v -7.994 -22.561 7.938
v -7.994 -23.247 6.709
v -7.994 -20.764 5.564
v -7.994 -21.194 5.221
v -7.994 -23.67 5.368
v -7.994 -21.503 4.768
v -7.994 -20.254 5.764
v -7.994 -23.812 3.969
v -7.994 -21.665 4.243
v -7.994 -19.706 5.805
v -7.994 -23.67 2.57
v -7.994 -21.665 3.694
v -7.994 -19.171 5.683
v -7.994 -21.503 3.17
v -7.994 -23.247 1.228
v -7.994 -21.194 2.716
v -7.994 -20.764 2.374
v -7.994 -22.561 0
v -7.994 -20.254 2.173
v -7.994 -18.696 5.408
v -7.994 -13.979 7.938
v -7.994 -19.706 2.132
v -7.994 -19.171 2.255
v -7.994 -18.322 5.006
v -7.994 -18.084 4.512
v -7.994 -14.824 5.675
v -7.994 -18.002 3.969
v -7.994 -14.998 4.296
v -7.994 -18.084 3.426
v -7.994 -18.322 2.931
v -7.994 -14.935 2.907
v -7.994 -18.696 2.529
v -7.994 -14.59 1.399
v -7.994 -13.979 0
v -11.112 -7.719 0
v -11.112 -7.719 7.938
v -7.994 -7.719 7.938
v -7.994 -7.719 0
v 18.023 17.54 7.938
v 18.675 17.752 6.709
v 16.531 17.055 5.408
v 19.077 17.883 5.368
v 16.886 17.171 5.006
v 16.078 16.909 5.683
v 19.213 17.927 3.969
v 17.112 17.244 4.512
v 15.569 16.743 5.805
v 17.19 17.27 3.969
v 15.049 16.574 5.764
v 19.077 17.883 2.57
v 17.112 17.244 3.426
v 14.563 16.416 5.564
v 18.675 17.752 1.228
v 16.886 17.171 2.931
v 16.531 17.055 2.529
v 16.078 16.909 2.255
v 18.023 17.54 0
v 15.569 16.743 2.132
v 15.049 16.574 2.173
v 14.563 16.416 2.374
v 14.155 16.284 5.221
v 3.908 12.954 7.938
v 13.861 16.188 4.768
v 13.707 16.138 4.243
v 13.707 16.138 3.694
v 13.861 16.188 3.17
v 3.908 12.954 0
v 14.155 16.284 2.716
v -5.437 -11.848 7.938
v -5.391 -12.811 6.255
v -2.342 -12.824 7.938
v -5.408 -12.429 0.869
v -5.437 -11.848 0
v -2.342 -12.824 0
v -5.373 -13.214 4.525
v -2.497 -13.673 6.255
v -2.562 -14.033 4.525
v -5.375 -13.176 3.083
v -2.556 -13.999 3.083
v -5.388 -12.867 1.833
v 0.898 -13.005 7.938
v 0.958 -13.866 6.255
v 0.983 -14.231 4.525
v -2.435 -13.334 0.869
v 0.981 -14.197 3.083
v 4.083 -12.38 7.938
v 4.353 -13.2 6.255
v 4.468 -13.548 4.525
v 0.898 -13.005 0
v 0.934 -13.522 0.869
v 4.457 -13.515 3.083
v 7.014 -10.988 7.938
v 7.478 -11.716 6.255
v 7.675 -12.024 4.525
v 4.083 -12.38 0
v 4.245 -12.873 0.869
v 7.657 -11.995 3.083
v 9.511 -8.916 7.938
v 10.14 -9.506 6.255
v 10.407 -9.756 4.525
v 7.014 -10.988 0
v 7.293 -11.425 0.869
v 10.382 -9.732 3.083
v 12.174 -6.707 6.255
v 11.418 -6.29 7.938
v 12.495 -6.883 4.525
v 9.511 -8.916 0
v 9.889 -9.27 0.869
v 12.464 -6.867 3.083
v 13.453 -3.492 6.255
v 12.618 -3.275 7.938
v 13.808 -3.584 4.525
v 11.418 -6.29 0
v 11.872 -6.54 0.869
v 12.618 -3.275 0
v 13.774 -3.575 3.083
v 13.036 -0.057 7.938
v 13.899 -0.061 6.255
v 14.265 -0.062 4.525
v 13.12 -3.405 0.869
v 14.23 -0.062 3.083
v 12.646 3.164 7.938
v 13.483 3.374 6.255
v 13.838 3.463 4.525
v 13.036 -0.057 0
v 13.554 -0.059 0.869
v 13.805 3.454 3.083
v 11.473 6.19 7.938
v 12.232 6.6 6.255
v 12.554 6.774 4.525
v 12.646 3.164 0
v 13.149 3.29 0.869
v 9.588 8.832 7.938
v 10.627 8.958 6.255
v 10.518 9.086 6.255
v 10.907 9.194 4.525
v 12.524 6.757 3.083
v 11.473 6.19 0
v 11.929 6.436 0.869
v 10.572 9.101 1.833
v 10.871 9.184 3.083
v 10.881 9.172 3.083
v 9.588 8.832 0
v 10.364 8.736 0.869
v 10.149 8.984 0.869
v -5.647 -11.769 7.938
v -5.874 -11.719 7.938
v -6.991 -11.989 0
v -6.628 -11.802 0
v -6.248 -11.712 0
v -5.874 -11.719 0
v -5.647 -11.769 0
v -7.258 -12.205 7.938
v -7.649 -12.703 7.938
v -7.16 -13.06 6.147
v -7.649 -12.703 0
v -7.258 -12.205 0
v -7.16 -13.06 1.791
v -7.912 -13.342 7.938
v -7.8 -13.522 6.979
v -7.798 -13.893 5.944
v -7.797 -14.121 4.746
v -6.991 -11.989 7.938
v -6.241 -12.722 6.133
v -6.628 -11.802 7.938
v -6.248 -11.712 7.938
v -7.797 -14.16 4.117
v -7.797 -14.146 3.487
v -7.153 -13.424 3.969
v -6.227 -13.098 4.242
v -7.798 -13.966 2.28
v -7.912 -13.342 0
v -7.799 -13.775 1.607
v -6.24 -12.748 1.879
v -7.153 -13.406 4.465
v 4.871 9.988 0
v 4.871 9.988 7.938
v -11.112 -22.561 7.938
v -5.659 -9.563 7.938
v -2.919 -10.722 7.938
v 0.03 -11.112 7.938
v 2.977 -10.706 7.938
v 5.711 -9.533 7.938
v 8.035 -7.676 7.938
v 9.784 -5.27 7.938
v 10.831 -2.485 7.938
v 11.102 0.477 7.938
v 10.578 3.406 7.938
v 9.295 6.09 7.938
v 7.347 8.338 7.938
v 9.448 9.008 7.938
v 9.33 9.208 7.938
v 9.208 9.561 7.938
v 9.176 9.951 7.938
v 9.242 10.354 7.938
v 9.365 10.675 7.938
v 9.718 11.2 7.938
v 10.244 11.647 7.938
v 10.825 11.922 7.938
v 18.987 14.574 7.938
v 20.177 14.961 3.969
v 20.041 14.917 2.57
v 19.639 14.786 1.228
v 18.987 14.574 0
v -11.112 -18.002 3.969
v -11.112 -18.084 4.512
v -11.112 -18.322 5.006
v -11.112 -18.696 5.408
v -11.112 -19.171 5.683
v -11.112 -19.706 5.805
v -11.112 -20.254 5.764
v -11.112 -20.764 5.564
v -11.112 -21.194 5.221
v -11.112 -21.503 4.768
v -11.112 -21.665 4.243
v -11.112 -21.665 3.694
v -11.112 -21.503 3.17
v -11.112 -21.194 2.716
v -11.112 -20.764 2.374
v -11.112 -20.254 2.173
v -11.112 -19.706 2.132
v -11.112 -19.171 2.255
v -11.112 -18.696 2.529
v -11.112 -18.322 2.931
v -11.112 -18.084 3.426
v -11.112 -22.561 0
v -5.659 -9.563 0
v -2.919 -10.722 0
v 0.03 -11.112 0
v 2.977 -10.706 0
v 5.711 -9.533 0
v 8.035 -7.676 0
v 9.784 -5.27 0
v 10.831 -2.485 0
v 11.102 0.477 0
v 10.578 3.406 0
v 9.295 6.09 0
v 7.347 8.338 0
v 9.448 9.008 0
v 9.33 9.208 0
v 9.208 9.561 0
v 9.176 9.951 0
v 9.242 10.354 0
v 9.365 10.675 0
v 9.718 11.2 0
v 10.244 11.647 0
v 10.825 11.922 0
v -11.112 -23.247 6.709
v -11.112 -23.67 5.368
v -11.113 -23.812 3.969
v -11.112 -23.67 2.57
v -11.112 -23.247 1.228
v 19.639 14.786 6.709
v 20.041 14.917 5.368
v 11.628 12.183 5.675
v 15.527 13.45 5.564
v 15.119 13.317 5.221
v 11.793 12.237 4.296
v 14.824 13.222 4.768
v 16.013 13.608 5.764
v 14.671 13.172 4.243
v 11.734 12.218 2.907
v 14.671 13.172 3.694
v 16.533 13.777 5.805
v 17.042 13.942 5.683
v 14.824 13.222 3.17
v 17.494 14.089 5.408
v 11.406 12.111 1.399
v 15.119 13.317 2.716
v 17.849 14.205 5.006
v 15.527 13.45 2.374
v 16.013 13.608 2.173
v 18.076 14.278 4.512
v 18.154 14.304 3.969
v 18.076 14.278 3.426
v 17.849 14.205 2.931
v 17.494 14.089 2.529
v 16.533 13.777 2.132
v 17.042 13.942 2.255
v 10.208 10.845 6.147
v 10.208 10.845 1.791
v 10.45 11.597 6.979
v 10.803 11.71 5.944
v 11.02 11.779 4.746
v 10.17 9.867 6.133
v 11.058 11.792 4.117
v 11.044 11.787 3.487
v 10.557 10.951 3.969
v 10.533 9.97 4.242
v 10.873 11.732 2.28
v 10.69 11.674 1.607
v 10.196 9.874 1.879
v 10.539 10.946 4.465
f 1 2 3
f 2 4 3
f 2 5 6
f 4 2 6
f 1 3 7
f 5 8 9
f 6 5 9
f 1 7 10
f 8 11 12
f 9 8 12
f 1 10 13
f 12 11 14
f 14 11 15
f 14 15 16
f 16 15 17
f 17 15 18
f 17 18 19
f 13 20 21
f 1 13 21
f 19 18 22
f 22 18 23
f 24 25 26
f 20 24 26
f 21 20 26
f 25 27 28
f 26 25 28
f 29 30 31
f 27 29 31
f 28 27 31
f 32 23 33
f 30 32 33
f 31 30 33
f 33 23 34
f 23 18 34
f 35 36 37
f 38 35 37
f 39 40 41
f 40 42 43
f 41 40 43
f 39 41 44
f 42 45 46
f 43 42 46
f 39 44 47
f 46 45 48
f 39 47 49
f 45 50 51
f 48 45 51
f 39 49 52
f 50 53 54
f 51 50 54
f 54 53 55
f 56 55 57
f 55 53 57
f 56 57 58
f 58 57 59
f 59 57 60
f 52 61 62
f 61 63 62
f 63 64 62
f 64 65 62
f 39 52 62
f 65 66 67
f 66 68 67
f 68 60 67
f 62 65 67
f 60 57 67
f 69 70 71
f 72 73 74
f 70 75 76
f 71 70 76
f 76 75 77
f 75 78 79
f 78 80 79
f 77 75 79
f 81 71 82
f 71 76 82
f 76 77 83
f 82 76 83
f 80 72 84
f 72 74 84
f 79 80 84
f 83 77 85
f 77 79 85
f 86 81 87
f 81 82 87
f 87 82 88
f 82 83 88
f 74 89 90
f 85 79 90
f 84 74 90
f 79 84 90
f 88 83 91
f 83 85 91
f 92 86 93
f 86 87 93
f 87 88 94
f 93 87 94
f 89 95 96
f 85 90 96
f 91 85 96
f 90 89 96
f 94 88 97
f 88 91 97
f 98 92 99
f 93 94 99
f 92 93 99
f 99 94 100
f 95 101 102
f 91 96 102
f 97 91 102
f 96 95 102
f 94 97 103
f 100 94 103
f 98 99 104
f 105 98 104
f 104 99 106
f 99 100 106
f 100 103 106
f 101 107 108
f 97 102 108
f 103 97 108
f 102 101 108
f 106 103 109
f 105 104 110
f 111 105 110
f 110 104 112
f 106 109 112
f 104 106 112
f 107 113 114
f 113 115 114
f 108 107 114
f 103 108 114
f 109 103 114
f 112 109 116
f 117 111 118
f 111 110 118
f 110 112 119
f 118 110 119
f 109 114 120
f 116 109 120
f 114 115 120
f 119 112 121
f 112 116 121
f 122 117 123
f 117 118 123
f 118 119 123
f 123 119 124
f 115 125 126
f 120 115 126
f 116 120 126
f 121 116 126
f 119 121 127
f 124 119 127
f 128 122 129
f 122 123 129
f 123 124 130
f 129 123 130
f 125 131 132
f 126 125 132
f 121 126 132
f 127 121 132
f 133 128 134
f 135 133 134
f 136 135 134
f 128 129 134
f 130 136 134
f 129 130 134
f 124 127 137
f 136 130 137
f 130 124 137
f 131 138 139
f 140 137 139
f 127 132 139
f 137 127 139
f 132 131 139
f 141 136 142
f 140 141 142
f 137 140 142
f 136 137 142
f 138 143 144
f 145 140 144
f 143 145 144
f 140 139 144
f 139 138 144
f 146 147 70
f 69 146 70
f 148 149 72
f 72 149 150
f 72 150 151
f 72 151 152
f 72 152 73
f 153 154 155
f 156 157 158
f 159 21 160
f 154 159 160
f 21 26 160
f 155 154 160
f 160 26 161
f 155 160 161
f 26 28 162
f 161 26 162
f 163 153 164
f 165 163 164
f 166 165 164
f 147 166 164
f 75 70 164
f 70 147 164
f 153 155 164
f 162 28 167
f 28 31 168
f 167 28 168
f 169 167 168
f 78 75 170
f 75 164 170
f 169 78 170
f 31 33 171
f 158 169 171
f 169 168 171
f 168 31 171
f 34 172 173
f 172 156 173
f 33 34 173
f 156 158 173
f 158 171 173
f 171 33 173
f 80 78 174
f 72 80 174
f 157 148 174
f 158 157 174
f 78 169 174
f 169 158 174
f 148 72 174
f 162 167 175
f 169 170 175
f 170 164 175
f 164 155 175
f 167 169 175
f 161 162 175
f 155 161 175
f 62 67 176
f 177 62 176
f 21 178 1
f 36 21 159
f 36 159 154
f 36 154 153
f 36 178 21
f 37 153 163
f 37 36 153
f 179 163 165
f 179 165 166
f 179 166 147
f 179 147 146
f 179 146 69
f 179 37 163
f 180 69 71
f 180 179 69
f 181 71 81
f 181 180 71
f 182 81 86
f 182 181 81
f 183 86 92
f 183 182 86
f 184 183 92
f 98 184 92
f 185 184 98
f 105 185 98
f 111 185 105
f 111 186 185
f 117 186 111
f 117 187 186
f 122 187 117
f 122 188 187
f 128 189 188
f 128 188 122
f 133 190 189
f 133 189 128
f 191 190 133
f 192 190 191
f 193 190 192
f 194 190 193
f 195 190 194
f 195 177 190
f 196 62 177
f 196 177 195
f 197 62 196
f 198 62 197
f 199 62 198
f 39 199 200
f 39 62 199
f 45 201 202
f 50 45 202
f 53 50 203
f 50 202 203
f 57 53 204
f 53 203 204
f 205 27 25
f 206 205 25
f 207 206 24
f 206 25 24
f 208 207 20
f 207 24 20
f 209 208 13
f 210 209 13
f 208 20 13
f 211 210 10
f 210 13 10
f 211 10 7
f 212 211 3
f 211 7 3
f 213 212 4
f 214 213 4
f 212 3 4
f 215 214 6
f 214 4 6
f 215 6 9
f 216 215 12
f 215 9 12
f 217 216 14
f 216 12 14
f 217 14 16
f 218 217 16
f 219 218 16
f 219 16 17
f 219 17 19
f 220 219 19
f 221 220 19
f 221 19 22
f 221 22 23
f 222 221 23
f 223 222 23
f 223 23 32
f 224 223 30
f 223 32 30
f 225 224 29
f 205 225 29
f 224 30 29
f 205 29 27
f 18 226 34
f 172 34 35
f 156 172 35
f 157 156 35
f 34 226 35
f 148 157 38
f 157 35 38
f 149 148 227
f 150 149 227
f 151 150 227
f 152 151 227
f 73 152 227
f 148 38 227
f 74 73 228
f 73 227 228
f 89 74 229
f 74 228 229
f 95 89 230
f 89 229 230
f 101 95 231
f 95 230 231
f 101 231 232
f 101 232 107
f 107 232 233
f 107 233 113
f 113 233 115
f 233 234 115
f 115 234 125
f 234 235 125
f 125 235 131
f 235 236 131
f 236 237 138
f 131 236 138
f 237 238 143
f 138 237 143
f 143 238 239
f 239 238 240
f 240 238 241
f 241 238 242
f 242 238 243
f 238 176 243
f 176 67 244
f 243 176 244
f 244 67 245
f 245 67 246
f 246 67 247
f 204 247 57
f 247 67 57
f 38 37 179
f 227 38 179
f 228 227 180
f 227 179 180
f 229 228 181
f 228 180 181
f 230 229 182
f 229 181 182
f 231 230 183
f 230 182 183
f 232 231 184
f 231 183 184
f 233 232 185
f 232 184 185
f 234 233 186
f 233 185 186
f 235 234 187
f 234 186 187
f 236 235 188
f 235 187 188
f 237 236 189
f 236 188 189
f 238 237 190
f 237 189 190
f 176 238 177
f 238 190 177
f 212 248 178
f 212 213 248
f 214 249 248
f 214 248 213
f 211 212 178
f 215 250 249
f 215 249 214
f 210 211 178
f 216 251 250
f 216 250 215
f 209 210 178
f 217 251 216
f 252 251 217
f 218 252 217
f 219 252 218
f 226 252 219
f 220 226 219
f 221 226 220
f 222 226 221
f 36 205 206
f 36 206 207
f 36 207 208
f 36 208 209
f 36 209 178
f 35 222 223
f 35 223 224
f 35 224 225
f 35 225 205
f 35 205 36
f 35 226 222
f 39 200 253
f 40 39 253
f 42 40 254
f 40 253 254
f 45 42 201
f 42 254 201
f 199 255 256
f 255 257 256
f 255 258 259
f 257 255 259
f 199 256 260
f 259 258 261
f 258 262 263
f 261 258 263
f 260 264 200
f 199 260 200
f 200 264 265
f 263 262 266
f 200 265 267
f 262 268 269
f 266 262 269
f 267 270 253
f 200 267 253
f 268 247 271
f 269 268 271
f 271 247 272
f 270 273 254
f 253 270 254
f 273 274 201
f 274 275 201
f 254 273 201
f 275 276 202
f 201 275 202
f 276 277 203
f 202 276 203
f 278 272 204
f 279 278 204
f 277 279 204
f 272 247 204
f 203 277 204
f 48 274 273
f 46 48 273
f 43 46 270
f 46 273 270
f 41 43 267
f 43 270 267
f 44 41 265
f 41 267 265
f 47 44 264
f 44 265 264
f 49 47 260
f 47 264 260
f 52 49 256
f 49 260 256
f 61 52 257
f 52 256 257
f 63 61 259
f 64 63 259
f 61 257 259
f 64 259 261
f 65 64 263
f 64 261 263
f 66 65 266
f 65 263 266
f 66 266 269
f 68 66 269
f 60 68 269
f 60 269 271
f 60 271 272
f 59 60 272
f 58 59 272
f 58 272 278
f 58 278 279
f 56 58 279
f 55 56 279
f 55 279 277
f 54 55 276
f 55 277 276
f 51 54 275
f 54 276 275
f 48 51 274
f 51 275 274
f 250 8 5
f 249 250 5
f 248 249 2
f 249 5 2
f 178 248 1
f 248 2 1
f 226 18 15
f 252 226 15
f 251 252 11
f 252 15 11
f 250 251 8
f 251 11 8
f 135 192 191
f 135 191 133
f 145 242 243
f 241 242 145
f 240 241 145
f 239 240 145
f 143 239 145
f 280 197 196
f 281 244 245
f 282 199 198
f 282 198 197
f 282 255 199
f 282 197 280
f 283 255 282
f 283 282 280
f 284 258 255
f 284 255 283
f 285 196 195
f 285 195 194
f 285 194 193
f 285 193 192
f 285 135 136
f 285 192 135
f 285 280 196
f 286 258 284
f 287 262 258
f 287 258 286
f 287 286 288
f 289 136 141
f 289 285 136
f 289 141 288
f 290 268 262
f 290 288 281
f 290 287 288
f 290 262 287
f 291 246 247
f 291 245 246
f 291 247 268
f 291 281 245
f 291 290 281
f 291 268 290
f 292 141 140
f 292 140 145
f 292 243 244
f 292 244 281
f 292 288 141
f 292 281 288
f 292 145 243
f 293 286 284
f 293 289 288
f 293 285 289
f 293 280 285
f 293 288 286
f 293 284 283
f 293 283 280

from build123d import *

# Parameters (mm, degrees)
F4_DEPTH  = 7.9385001
F5_W      = 3.1188364687
F5_H      = 16.0931088583
F6_DEPTH  = 7.9375
F7_R      = 1.8415
F8_DEPTH  = 3.1188364687
F9_R      = 1.8415
F10_DEPTH = 3.1188364687
F11_R     = 1.905


with BuildPart() as f2:
    # F1 (on Front) → F2 (revolve)
    with BuildSketch(Plane.XZ):
        with BuildLine():
            ThreePointArc((-13.0361579316, 7.9375), (-14.2875, 3.96875), (-13.0361579316, 0))
            Line((-13.0361579316, 0), (-11.1125, 0))
            Line((-11.1125, 0), (-11.1125, 7.9375))
            Line((-11.1125, 7.9375), (-13.0361579316, 7.9375))
        make_face()
    revolve(axis=Axis((0, 0, 3.96875), (0, 0, 1)))

    # F3 (on face) → F4 (cut, through all)
    with BuildSketch(Plane.XY.offset(7.9375)):
        with BuildLine():
            Line((-10.2775673973, -9.9249314679), (-9.3774272437, -9.0556762258))
            ThreePointArc((-9.3774272437, -9.0556762258), (-10.546473308, 7.6624613788), (5.7146755022, 11.7168211356))
            Line((5.7146755022, 11.7168211356), (6.2632277597, 12.8415199365))
            ThreePointArc((6.2632277597, 12.8415199365), (-11.5588303071, 8.3979817921), (-10.2775673973, -9.9249314679))
        make_face()
        with BuildLine():
            Line((-9.3774272437, -9.0556762258), (-7.9936635313, -7.7193911417))
            ThreePointArc((-7.9936635313, -7.7193911417), (-8.99020135, 6.5317636161), (4.8713993687, 9.9878488395))
            Line((4.8713993687, 9.9878488395), (5.7146755022, 11.7168211356))
            ThreePointArc((5.7146755022, 11.7168211356), (-10.546473308, 7.6624613788), (-9.3774272437, -9.0556762258))
        make_face()
    extrude(amount=-F4_DEPTH, mode=Mode.SUBTRACT)

    # F5 (on Top) → F6 (join, through all)
    with BuildSketch(Plane.XY):
        with Locations((-9.5530817656, -15.7659455709)):
            Rectangle(F5_W, F5_H)
        Polygon((20.1768554158, 14.960892969), (19.2130819443, 17.9270827159), (3.9076258972, 12.9540385864), (4.8713993687, 9.9878488395), align=None)
    extrude(amount=F6_DEPTH)

    # F7 (on face) → F8 (cut, through all)
    with BuildSketch(Plane.YZ.offset(-7.9936635313)):
        with BuildLine():
            ThreePointArc((-23.8125, 3.96875), (-23.4922534904, 6.0494249827), (-22.5611579316, 7.9375))
            Line((-22.5611579316, 7.9375), (-23.8125, 7.9375))
            Line((-23.8125, 7.9375), (-23.8125, 3.96875))
        make_face()
        with BuildLine():
            Line((-23.8125, 0), (-22.5611579316, 0))
            ThreePointArc((-22.5611579316, 0), (-23.4922534904, 1.8880750173), (-23.8125, 3.96875))
            Line((-23.8125, 3.96875), (-23.8125, 0))
        make_face()
        with Locations((-19.84375, 3.96875)):
            Circle(F7_R)
    extrude(amount=-F8_DEPTH, mode=Mode.SUBTRACT)

    # F9 (on face) → F10 (cut, through all)
    with BuildSketch(Plane(origin=(-2.4701778785, 7.6024257905, 0), x_dir=(0.9510565163, 0.3090169944, 0), z_dir=(0.3090169944, -0.9510565163, 0))):
        with Locations((19.84375, 3.96875)):
            Circle(F9_R)
        with BuildLine():
            ThreePointArc((22.5611579316, 7.9375), (23.4922534904, 6.0494249827), (23.8125, 3.96875))
            Line((23.8125, 3.96875), (23.8125, 7.9375))
            Line((23.8125, 7.9375), (22.5611579316, 7.9375))
        make_face()
        with BuildLine():
            ThreePointArc((23.8125, 3.96875), (23.4922534904, 1.8880750173), (22.5611579316, 0))
            Line((22.5611579316, 0), (23.8125, 0))
            Line((23.8125, 0), (23.8125, 3.96875))
        make_face()
    extrude(amount=-F10_DEPTH, mode=Mode.SUBTRACT)

    # F11
    f11_edges = [f2.edges().sort_by_distance(p)[0] for p in [
        (-7.993664, -11.842044, 3.96875),
        (8.792275, 11.261819, 3.96875),
    ]]
    fillet(f11_edges, radius=F11_R)


solid = f2.part
